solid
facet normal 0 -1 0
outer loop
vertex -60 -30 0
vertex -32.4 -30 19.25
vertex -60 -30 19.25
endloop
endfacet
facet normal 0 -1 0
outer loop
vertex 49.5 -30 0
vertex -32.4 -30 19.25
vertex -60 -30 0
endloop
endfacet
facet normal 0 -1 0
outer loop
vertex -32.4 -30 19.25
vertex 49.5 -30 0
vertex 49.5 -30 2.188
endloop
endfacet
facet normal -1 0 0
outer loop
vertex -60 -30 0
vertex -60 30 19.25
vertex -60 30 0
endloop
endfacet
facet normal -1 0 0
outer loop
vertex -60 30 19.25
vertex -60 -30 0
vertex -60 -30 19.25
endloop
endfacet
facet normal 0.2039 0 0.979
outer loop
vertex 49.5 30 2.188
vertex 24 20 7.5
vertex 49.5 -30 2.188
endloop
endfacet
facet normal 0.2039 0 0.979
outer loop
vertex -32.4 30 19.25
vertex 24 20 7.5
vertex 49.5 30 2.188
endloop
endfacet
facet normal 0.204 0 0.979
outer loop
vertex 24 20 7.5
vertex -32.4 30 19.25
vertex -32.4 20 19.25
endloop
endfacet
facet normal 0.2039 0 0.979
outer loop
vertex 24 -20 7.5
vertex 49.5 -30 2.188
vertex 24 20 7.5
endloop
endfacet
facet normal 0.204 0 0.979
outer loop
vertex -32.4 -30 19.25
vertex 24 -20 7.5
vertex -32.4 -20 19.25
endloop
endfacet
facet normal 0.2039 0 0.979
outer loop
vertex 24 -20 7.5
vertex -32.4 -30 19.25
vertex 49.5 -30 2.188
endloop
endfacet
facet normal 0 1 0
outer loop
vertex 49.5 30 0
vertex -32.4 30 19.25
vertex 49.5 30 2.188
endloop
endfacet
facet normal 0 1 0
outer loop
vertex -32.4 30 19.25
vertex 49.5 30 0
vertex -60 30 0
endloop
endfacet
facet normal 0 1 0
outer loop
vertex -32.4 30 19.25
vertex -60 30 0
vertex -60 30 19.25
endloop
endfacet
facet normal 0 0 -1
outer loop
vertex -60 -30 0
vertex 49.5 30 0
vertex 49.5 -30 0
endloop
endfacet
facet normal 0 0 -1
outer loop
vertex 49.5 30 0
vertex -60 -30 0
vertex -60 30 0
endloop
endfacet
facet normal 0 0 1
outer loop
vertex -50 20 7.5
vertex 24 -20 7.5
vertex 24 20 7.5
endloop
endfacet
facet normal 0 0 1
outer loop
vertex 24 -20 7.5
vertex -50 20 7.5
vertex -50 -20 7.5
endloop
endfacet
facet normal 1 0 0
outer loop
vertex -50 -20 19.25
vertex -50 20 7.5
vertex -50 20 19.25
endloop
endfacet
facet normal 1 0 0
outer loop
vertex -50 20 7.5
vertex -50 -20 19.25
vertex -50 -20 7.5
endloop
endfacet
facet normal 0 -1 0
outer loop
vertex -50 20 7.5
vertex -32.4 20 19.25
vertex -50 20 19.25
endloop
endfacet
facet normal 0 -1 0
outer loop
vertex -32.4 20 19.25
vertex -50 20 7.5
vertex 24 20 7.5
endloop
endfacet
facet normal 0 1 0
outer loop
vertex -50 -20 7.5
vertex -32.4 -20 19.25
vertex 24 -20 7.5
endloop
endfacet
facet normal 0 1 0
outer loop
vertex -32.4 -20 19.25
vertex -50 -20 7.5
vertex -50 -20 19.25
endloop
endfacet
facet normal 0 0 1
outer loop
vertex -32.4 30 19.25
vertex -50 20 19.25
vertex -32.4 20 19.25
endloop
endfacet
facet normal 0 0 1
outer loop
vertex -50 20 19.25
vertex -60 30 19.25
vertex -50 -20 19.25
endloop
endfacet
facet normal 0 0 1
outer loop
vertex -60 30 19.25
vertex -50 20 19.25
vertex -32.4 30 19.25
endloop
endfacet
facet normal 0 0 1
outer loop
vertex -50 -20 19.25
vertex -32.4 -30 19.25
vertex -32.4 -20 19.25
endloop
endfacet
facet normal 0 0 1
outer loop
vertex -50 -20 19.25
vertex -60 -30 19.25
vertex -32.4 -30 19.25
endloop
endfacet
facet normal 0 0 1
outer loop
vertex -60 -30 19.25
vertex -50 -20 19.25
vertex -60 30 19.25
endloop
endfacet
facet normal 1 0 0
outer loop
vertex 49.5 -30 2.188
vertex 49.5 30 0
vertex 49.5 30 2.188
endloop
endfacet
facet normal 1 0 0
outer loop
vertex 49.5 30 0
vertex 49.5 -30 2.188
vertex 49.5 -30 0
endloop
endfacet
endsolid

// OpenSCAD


//height
height = 25  ;
//length
length = 120 ;
//width
width= 60 ;


module toto() {
}

$fn = 24;

half_width  = width / 2;

ep_bor = 10;
bottom_cube_length = length - 4 * ep_bor;
bottom_cube_width = width - 2 * ep_bor;
bottom_cube_height = 6; // 3mm in / 3mm outsite
bottom_z = 0;
top_cube_length = length - 4 * ep_bor;
top_cube_width  = width - 2 * ep_bor;
top_cube_height = height;
top_z = height/2 + 7.5;
tip_cut_pos = length/2 - 0.5;
top_tip_pos = height + 0.5;




bloque_porte();

module bloque_porte()
{
 
 
    difference() {
	translate ([-length/2.0, 0, 0])
    	    polyhedron (	
	    		points = [[0, -half_width, height], [0, half_width, height], [0, half_width, 0], [0, -half_width, 0], [length, -half_width, 0], [length, half_width, 0]],
			faces = [[0,3,2], [0,2,1], [3,0,4], [1,2,5], [0,5,4], [0,1,5],  [5,2,4], [4,2,3], ]);

	translate ([-1 * ep_bor, 0, top_z]) 
	     cube ([top_cube_length,
		     top_cube_width,
		     top_cube_height],
		    center=true) ;
	
	translate ([- length/2 + 10, 0, top_tip_pos]) 
	     cube ([length / 2,
		     width+2,
		     height / 2],
		    center=true) ;
	
	translate ([tip_cut_pos, 0, 0]) 
	     cube ([20,
		   width + 1,
		   height],
		  center=true) ;
	
    }	    
}
